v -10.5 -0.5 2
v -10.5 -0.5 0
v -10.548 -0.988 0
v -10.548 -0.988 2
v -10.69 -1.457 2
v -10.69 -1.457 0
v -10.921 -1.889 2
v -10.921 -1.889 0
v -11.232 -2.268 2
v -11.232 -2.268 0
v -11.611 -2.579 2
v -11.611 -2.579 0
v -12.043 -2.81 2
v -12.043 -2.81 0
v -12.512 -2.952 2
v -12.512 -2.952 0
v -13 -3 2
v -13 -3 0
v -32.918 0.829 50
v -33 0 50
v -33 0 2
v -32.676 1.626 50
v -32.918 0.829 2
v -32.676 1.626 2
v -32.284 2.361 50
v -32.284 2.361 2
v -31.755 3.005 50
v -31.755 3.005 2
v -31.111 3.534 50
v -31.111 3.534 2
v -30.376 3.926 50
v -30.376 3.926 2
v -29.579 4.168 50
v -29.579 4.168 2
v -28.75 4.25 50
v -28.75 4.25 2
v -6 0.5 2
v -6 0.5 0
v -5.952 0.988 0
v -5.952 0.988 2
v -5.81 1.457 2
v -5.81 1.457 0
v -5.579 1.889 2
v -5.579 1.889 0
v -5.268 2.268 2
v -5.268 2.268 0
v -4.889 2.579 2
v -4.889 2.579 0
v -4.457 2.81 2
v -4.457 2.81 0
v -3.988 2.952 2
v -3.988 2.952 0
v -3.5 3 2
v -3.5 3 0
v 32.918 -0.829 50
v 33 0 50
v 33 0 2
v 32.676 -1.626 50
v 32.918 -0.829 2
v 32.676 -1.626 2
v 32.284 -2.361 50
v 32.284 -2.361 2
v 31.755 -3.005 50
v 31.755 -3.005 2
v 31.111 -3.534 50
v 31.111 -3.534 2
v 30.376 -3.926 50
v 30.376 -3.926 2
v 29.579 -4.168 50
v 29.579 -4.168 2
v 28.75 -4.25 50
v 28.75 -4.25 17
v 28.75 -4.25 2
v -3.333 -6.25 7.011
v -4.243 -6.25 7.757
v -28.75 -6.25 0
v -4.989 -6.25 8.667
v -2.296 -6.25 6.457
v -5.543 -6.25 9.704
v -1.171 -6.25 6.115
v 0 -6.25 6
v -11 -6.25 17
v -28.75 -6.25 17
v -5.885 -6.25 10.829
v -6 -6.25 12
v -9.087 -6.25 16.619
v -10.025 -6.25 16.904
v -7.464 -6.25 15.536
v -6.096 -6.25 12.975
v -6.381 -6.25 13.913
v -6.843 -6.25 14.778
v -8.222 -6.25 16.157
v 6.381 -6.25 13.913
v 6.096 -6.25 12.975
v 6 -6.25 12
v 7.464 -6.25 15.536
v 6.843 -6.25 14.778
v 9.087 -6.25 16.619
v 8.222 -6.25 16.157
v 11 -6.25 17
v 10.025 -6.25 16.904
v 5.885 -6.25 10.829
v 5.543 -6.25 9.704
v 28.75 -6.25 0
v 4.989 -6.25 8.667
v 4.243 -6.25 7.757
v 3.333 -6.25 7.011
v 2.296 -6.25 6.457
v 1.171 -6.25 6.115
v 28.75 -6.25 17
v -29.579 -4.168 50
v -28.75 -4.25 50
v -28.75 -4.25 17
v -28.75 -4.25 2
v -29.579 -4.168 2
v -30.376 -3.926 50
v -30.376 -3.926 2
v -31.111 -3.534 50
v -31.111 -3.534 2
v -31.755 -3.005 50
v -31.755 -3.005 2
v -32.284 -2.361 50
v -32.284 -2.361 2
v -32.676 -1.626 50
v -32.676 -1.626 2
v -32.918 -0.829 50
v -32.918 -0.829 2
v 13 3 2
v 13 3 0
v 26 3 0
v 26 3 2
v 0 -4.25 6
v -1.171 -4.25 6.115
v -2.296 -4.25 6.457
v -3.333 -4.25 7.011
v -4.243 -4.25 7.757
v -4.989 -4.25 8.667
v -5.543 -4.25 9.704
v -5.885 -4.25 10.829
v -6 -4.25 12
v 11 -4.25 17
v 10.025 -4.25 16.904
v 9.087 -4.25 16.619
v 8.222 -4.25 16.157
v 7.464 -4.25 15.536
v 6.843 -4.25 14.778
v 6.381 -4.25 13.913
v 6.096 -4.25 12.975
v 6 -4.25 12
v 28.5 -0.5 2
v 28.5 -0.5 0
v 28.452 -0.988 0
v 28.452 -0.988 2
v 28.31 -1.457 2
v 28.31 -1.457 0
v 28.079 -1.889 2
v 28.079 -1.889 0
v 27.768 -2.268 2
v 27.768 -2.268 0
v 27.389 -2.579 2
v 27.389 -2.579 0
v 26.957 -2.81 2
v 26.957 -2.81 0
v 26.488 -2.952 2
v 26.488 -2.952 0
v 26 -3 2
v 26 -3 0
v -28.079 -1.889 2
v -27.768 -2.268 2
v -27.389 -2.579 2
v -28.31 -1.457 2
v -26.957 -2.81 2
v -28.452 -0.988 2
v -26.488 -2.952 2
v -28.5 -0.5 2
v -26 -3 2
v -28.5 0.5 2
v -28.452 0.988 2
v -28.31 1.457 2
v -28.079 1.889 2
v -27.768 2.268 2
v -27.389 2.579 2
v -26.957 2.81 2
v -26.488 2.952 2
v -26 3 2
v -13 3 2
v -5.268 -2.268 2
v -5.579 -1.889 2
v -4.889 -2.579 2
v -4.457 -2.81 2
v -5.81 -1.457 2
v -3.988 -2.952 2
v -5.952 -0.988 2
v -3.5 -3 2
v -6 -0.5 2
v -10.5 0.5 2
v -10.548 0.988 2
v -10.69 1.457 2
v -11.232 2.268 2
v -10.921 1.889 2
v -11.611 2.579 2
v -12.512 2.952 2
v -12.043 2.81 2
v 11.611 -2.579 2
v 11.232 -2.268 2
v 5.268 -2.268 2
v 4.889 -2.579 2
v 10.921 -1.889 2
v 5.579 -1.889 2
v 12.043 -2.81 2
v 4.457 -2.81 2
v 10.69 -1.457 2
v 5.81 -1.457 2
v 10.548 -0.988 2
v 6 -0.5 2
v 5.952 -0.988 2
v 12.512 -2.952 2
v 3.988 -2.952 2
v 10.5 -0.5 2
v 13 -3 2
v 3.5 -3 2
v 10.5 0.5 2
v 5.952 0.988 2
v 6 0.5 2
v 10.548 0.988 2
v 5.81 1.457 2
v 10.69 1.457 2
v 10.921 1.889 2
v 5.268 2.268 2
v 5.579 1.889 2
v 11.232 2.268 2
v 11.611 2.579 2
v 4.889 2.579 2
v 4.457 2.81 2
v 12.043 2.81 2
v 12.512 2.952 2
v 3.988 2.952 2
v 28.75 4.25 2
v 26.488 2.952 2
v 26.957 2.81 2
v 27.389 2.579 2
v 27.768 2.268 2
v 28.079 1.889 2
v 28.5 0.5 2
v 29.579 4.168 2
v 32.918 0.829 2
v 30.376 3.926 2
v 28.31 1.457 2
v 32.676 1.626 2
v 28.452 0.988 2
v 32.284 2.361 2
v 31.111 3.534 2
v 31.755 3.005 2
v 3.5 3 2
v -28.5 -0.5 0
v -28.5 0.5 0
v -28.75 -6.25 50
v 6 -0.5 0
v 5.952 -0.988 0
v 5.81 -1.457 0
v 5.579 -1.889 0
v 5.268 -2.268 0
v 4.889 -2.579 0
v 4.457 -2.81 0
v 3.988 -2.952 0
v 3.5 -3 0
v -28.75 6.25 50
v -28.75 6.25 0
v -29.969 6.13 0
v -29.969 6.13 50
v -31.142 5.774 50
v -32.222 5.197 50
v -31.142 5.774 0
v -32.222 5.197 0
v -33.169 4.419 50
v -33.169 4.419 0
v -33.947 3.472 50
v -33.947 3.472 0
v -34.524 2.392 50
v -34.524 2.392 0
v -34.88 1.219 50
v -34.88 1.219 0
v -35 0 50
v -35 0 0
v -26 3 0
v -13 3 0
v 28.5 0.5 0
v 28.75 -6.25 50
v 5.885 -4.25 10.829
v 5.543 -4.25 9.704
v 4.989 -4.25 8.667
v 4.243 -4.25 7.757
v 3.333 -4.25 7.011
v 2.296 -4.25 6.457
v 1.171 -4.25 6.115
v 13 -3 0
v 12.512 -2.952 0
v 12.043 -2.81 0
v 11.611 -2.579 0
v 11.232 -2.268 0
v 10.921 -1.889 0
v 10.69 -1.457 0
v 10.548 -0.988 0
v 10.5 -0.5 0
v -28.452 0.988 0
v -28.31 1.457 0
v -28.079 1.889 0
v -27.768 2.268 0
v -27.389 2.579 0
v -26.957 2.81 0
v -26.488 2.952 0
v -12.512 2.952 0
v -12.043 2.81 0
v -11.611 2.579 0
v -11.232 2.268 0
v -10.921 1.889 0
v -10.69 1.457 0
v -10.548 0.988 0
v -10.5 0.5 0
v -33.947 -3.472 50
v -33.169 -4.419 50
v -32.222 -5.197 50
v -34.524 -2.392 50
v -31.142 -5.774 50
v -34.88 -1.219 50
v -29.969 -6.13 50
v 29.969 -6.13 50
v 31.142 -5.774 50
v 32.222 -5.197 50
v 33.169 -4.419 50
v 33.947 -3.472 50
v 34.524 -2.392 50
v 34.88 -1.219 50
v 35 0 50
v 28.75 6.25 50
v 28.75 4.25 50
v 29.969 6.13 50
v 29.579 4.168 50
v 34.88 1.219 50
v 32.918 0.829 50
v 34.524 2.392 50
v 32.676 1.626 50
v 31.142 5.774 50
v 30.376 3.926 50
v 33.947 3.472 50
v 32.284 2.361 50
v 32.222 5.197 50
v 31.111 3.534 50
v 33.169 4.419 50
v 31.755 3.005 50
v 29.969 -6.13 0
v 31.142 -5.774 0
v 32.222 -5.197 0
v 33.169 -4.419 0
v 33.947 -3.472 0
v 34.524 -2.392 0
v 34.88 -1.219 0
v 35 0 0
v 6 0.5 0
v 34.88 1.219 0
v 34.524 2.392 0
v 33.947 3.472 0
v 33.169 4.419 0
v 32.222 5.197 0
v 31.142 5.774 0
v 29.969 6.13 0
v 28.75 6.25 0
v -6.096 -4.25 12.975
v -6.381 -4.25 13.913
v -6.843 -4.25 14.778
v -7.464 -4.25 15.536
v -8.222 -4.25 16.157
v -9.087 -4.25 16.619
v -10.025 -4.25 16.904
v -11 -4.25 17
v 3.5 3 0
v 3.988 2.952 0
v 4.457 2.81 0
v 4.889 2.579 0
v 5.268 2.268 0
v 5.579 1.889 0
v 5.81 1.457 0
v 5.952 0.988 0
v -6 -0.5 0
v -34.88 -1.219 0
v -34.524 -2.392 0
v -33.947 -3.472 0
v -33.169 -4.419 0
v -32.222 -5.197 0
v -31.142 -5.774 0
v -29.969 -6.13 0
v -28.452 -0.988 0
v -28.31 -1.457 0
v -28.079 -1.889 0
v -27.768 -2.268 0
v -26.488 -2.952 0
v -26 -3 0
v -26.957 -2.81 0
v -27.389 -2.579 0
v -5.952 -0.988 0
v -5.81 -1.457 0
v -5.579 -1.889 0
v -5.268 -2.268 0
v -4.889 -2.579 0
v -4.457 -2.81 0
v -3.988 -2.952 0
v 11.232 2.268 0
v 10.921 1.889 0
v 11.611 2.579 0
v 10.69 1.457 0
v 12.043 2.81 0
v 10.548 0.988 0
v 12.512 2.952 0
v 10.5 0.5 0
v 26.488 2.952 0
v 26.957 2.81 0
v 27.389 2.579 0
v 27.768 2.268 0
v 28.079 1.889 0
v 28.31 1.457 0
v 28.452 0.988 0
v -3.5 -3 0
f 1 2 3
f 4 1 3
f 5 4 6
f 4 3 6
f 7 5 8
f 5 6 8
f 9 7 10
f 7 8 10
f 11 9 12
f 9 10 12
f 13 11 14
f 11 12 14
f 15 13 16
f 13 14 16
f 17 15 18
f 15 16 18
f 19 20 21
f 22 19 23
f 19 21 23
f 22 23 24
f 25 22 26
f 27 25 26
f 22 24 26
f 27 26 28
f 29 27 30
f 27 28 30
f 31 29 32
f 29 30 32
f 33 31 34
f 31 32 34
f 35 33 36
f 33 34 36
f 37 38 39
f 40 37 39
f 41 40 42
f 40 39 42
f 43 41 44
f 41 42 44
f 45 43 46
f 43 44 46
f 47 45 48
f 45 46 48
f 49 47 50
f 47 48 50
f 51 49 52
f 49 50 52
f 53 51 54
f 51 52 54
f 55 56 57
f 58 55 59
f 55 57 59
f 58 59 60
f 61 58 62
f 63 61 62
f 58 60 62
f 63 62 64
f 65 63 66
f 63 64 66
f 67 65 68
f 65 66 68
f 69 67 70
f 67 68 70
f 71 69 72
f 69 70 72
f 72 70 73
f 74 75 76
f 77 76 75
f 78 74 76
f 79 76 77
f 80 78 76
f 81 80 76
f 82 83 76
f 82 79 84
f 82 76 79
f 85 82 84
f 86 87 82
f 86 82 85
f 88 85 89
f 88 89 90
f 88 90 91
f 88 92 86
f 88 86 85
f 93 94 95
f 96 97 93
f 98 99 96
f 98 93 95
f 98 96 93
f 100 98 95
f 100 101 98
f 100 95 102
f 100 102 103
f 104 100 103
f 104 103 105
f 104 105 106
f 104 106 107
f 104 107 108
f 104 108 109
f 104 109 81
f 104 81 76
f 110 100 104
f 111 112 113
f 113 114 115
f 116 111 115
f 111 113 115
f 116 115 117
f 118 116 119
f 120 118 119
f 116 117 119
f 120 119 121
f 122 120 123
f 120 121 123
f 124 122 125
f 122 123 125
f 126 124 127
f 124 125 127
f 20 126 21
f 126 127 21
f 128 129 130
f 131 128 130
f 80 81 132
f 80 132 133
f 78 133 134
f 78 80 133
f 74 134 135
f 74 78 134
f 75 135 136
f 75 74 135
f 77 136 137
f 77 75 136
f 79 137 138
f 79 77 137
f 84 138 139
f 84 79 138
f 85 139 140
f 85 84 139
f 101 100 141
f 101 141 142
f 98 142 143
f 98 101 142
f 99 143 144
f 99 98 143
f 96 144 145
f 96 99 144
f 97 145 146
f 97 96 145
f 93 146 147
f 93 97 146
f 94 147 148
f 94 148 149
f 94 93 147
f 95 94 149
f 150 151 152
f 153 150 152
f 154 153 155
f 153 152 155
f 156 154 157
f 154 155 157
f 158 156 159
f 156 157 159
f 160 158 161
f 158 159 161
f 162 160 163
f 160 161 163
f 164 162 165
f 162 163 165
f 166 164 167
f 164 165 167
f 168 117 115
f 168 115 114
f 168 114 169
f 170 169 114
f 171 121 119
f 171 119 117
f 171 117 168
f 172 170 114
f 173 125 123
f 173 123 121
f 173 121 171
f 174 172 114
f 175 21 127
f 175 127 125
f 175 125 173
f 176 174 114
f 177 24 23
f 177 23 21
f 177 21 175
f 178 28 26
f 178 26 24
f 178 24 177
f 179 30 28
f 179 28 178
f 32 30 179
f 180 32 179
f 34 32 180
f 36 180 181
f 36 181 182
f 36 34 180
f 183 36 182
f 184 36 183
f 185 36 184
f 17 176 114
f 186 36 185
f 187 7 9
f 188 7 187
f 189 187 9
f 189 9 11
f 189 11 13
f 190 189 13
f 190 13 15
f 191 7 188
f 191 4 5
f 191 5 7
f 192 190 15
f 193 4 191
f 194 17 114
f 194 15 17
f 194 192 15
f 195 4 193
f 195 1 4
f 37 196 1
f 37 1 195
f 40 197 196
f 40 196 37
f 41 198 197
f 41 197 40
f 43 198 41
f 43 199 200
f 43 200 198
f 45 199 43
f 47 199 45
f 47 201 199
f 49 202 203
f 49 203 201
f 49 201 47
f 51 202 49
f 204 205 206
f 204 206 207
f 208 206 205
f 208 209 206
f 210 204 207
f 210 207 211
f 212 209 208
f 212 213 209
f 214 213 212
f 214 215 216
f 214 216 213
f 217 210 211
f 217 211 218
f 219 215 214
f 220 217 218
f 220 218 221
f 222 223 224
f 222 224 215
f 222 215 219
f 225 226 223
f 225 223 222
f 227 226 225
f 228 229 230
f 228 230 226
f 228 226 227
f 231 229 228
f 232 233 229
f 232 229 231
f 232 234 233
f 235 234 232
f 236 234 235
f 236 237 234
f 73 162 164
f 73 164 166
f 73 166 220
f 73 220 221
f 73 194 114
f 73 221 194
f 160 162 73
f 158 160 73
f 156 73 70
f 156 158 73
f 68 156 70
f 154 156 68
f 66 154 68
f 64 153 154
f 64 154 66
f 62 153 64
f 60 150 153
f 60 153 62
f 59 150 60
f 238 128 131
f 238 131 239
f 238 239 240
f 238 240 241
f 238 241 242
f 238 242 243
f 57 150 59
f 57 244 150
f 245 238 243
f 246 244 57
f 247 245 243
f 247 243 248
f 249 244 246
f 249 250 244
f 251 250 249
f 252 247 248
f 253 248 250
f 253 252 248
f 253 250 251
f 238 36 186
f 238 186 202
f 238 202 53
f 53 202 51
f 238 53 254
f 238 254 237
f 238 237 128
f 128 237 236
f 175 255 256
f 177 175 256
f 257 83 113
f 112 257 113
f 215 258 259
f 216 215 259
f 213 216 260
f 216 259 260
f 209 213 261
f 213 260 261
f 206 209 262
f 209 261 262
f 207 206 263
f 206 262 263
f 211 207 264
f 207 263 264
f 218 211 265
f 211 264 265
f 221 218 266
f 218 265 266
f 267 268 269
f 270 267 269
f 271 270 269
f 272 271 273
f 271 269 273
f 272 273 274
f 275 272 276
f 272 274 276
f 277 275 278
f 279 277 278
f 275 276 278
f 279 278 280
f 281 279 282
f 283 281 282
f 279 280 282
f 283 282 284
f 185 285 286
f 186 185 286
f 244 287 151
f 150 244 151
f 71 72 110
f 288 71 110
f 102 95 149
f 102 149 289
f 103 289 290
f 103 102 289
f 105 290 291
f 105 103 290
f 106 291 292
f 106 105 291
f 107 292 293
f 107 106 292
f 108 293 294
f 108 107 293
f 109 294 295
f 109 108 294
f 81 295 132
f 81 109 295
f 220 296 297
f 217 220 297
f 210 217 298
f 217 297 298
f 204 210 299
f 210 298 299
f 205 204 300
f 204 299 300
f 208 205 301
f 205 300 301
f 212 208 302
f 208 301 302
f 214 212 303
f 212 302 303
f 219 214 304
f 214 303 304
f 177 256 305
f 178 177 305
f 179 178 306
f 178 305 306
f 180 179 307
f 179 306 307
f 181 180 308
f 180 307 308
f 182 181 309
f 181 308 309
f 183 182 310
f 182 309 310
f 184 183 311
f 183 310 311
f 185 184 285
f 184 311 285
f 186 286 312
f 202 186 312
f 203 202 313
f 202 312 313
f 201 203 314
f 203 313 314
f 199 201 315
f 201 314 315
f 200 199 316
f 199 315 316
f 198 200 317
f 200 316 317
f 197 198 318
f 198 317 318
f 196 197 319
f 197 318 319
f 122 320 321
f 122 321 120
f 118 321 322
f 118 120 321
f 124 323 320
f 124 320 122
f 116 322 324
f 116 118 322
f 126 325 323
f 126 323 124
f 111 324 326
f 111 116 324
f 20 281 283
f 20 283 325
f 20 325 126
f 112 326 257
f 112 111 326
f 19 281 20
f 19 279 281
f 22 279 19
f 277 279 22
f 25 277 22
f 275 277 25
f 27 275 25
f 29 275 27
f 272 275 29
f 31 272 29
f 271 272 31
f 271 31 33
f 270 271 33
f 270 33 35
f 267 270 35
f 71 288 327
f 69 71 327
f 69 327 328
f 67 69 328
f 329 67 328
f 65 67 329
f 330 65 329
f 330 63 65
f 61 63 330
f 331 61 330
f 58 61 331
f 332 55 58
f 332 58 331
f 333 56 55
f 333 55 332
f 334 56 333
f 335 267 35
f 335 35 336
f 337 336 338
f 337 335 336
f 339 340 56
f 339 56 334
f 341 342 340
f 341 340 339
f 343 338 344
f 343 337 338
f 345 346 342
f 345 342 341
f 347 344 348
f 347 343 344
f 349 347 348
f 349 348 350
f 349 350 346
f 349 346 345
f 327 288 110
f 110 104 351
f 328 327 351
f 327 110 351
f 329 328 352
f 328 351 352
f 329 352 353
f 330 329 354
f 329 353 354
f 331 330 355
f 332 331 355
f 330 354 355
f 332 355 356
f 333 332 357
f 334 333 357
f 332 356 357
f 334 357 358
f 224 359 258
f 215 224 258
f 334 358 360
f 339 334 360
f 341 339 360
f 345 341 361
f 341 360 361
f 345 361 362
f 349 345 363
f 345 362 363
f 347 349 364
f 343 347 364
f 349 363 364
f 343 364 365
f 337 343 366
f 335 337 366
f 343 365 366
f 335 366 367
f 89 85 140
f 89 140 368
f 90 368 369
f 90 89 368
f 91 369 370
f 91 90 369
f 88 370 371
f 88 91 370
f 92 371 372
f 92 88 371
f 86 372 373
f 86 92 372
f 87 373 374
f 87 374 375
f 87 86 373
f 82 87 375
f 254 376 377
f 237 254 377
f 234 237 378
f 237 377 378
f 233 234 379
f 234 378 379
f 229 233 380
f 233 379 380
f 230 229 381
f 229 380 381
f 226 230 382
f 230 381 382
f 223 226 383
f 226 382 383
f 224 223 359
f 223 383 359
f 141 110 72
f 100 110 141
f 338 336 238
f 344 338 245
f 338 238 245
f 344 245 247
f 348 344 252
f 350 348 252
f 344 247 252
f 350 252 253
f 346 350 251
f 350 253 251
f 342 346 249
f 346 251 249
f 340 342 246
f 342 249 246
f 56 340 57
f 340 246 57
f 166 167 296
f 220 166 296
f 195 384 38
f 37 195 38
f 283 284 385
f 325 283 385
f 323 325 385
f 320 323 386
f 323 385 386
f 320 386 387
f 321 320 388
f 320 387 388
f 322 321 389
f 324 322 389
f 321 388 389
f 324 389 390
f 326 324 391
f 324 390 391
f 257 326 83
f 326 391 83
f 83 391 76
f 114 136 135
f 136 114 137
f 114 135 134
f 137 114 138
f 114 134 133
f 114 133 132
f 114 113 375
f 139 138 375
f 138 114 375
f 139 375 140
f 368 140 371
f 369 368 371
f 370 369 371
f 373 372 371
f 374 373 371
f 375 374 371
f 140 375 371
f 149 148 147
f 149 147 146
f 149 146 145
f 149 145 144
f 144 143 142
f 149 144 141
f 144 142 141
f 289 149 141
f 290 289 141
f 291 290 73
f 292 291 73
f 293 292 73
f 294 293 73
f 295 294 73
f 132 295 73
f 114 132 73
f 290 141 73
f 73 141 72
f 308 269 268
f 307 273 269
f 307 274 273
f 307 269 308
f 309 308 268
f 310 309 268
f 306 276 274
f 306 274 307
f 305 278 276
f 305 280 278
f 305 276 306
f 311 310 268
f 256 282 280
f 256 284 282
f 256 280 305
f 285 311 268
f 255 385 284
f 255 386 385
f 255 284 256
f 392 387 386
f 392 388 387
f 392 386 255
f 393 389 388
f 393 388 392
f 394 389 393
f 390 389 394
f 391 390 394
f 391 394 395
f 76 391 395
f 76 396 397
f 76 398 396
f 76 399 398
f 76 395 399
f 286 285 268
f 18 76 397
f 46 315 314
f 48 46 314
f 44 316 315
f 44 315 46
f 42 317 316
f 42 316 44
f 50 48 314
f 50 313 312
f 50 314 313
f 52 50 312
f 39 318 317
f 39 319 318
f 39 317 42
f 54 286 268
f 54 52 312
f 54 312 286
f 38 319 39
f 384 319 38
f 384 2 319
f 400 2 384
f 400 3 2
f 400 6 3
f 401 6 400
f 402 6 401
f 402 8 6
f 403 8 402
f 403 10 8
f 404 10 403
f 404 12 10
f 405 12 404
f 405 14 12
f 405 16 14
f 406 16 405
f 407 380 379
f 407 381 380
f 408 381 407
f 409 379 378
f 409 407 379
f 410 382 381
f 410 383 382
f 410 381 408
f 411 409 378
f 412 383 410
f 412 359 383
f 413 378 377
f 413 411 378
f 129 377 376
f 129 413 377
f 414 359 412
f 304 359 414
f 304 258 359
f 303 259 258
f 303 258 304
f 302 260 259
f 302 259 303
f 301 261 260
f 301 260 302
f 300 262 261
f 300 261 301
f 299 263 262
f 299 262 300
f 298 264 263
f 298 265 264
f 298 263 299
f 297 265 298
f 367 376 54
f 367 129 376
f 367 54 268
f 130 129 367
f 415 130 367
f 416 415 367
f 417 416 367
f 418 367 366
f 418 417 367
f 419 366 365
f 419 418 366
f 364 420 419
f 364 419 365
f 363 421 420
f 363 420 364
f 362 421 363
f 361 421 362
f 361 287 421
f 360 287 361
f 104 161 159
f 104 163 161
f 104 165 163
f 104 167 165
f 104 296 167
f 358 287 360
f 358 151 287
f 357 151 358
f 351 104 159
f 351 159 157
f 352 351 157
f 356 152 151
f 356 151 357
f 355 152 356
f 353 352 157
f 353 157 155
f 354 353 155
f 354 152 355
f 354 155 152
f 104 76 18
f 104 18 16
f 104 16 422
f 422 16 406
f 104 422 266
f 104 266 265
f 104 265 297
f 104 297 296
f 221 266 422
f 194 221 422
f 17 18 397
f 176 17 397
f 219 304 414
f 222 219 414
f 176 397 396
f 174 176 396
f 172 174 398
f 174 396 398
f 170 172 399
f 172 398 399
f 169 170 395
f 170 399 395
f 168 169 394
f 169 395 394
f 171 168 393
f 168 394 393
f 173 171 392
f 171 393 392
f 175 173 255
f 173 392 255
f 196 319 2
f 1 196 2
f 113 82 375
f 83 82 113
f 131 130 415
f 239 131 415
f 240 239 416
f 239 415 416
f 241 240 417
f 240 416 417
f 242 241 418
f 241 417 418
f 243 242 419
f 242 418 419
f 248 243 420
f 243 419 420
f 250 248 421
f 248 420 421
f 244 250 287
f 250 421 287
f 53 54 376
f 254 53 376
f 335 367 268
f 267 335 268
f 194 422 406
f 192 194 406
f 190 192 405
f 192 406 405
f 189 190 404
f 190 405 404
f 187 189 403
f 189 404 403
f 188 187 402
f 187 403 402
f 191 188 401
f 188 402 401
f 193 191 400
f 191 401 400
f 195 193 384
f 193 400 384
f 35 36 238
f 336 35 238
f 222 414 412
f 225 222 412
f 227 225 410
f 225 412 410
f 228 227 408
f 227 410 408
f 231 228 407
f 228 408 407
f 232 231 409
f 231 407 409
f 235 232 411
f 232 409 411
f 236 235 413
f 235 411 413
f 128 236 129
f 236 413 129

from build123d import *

# Parameters (mm, degrees)
F3_DEPTH = 50
F4_DEPTH = 2
F5_DEPTH = 2


with BuildPart() as f3:
    # F0 (on Top) → F3 (new body)
    with BuildSketch(Plane.XY):
        with BuildLine():
            ThreePointArc((35, 0), (33.169417, 4.419417), (28.75, 6.25))
            Line((28.75, 6.25), (-28.75, 6.25))
            ThreePointArc((-28.75, 6.25), (-33.169417, 4.419417), (-35, 0))
            ThreePointArc((-35, 0), (-33.169417, -4.419417), (-28.75, -6.25))
            Line((-28.75, -6.25), (-28.75, -4.25))
            ThreePointArc((-28.75, -4.25), (-31.755204, -3.005204), (-33, 0))
            ThreePointArc((-33, 0), (-31.755204, 3.005204), (-28.75, 4.25))
            Line((-28.75, 4.25), (28.75, 4.25))
            ThreePointArc((28.75, 4.25), (31.755204, 3.005204), (33, 0))
            ThreePointArc((33, 0), (31.755204, -3.005204), (28.75, -4.25))
            Line((28.75, -4.25), (28.75, -6.25))
            ThreePointArc((28.75, -6.25), (33.169417, -4.419417), (35, 0))
        make_face()
    extrude(amount=F3_DEPTH)

    # F0 (on Top) → F4 (join)
    with BuildSketch(Plane.XY):
        with BuildLine():
            Line((-28.75, -4.25), (28.75, -4.25))
            ThreePointArc((28.75, -4.25), (31.755204, -3.005204), (33, 0))
            ThreePointArc((33, 0), (31.755204, 3.005204), (28.75, 4.25))
            Line((28.75, 4.25), (-28.75, 4.25))
            ThreePointArc((-28.75, 4.25), (-31.755204, 3.005204), (-33, 0))
            ThreePointArc((-33, 0), (-31.755204, -3.005204), (-28.75, -4.25))
        make_face()
        with BuildLine():
            Line((-26, 3), (-13, 3))
            ThreePointArc((-13, 3), (-11.232233, 2.267767), (-10.5, 0.5))
            Line((-10.5, 0.5), (-10.5, -0.5))
            ThreePointArc((-10.5, -0.5), (-11.232233, -2.267767), (-13, -3))
            Line((-13, -3), (-26, -3))
            ThreePointArc((-26, -3), (-27.767767, -2.267767), (-28.5, -0.5))
            Line((-28.5, -0.5), (-28.5, 0.5))
            ThreePointArc((-28.5, 0.5), (-27.767767, 2.267767), (-26, 3))
        make_face(mode=Mode.SUBTRACT)
        with BuildLine():
            Line((3.5, -3), (-3.5, -3))
            ThreePointArc((-3.5, -3), (-5.267767, -2.267767), (-6, -0.5))
            Line((-6, -0.5), (-6, 0.5))
            ThreePointArc((-6, 0.5), (-5.267767, 2.267767), (-3.5, 3))
            Line((-3.5, 3), (3.5, 3))
            ThreePointArc((3.5, 3), (5.267767, 2.267767), (6, 0.5))
            Line((6, 0.5), (6, -0.5))
            ThreePointArc((6, -0.5), (5.267767, -2.267767), (3.5, -3))
        make_face(mode=Mode.SUBTRACT)
        with BuildLine():
            ThreePointArc((10.5, 0.5), (11.232233, 2.267767), (13, 3))
            Line((13, 3), (26, 3))
            ThreePointArc((26, 3), (27.767767, 2.267767), (28.5, 0.5))
            Line((28.5, 0.5), (28.5, -0.5))
            ThreePointArc((28.5, -0.5), (27.767767, -2.267767), (26, -3))
            Line((26, -3), (13, -3))
            ThreePointArc((13, -3), (11.232233, -2.267767), (10.5, -0.5))
            Line((10.5, -0.5), (10.5, 0.5))
        make_face(mode=Mode.SUBTRACT)
    extrude(amount=F4_DEPTH)

    # F2 (on face) → F5 (join)
    with BuildSketch(Plane.XZ.offset(6.25)):
        with BuildLine():
            Line((-28.75, 17), (-28.75, 0))
            Line((-28.75, 0), (28.75, 0))
            Line((28.75, 0), (28.75, 17))
            Line((28.75, 17), (11, 17))
            ThreePointArc((11, 17), (7.464466, 15.535534), (6, 12))
            ThreePointArc((6, 12), (4.242641, 7.757359), (0, 6))
            ThreePointArc((0, 6), (-4.242641, 7.757359), (-6, 12))
            ThreePointArc((-6, 12), (-7.464466, 15.535534), (-11, 17))
            Line((-11, 17), (-28.75, 17))
        make_face()
    extrude(amount=-F5_DEPTH)


solid = f3.part
